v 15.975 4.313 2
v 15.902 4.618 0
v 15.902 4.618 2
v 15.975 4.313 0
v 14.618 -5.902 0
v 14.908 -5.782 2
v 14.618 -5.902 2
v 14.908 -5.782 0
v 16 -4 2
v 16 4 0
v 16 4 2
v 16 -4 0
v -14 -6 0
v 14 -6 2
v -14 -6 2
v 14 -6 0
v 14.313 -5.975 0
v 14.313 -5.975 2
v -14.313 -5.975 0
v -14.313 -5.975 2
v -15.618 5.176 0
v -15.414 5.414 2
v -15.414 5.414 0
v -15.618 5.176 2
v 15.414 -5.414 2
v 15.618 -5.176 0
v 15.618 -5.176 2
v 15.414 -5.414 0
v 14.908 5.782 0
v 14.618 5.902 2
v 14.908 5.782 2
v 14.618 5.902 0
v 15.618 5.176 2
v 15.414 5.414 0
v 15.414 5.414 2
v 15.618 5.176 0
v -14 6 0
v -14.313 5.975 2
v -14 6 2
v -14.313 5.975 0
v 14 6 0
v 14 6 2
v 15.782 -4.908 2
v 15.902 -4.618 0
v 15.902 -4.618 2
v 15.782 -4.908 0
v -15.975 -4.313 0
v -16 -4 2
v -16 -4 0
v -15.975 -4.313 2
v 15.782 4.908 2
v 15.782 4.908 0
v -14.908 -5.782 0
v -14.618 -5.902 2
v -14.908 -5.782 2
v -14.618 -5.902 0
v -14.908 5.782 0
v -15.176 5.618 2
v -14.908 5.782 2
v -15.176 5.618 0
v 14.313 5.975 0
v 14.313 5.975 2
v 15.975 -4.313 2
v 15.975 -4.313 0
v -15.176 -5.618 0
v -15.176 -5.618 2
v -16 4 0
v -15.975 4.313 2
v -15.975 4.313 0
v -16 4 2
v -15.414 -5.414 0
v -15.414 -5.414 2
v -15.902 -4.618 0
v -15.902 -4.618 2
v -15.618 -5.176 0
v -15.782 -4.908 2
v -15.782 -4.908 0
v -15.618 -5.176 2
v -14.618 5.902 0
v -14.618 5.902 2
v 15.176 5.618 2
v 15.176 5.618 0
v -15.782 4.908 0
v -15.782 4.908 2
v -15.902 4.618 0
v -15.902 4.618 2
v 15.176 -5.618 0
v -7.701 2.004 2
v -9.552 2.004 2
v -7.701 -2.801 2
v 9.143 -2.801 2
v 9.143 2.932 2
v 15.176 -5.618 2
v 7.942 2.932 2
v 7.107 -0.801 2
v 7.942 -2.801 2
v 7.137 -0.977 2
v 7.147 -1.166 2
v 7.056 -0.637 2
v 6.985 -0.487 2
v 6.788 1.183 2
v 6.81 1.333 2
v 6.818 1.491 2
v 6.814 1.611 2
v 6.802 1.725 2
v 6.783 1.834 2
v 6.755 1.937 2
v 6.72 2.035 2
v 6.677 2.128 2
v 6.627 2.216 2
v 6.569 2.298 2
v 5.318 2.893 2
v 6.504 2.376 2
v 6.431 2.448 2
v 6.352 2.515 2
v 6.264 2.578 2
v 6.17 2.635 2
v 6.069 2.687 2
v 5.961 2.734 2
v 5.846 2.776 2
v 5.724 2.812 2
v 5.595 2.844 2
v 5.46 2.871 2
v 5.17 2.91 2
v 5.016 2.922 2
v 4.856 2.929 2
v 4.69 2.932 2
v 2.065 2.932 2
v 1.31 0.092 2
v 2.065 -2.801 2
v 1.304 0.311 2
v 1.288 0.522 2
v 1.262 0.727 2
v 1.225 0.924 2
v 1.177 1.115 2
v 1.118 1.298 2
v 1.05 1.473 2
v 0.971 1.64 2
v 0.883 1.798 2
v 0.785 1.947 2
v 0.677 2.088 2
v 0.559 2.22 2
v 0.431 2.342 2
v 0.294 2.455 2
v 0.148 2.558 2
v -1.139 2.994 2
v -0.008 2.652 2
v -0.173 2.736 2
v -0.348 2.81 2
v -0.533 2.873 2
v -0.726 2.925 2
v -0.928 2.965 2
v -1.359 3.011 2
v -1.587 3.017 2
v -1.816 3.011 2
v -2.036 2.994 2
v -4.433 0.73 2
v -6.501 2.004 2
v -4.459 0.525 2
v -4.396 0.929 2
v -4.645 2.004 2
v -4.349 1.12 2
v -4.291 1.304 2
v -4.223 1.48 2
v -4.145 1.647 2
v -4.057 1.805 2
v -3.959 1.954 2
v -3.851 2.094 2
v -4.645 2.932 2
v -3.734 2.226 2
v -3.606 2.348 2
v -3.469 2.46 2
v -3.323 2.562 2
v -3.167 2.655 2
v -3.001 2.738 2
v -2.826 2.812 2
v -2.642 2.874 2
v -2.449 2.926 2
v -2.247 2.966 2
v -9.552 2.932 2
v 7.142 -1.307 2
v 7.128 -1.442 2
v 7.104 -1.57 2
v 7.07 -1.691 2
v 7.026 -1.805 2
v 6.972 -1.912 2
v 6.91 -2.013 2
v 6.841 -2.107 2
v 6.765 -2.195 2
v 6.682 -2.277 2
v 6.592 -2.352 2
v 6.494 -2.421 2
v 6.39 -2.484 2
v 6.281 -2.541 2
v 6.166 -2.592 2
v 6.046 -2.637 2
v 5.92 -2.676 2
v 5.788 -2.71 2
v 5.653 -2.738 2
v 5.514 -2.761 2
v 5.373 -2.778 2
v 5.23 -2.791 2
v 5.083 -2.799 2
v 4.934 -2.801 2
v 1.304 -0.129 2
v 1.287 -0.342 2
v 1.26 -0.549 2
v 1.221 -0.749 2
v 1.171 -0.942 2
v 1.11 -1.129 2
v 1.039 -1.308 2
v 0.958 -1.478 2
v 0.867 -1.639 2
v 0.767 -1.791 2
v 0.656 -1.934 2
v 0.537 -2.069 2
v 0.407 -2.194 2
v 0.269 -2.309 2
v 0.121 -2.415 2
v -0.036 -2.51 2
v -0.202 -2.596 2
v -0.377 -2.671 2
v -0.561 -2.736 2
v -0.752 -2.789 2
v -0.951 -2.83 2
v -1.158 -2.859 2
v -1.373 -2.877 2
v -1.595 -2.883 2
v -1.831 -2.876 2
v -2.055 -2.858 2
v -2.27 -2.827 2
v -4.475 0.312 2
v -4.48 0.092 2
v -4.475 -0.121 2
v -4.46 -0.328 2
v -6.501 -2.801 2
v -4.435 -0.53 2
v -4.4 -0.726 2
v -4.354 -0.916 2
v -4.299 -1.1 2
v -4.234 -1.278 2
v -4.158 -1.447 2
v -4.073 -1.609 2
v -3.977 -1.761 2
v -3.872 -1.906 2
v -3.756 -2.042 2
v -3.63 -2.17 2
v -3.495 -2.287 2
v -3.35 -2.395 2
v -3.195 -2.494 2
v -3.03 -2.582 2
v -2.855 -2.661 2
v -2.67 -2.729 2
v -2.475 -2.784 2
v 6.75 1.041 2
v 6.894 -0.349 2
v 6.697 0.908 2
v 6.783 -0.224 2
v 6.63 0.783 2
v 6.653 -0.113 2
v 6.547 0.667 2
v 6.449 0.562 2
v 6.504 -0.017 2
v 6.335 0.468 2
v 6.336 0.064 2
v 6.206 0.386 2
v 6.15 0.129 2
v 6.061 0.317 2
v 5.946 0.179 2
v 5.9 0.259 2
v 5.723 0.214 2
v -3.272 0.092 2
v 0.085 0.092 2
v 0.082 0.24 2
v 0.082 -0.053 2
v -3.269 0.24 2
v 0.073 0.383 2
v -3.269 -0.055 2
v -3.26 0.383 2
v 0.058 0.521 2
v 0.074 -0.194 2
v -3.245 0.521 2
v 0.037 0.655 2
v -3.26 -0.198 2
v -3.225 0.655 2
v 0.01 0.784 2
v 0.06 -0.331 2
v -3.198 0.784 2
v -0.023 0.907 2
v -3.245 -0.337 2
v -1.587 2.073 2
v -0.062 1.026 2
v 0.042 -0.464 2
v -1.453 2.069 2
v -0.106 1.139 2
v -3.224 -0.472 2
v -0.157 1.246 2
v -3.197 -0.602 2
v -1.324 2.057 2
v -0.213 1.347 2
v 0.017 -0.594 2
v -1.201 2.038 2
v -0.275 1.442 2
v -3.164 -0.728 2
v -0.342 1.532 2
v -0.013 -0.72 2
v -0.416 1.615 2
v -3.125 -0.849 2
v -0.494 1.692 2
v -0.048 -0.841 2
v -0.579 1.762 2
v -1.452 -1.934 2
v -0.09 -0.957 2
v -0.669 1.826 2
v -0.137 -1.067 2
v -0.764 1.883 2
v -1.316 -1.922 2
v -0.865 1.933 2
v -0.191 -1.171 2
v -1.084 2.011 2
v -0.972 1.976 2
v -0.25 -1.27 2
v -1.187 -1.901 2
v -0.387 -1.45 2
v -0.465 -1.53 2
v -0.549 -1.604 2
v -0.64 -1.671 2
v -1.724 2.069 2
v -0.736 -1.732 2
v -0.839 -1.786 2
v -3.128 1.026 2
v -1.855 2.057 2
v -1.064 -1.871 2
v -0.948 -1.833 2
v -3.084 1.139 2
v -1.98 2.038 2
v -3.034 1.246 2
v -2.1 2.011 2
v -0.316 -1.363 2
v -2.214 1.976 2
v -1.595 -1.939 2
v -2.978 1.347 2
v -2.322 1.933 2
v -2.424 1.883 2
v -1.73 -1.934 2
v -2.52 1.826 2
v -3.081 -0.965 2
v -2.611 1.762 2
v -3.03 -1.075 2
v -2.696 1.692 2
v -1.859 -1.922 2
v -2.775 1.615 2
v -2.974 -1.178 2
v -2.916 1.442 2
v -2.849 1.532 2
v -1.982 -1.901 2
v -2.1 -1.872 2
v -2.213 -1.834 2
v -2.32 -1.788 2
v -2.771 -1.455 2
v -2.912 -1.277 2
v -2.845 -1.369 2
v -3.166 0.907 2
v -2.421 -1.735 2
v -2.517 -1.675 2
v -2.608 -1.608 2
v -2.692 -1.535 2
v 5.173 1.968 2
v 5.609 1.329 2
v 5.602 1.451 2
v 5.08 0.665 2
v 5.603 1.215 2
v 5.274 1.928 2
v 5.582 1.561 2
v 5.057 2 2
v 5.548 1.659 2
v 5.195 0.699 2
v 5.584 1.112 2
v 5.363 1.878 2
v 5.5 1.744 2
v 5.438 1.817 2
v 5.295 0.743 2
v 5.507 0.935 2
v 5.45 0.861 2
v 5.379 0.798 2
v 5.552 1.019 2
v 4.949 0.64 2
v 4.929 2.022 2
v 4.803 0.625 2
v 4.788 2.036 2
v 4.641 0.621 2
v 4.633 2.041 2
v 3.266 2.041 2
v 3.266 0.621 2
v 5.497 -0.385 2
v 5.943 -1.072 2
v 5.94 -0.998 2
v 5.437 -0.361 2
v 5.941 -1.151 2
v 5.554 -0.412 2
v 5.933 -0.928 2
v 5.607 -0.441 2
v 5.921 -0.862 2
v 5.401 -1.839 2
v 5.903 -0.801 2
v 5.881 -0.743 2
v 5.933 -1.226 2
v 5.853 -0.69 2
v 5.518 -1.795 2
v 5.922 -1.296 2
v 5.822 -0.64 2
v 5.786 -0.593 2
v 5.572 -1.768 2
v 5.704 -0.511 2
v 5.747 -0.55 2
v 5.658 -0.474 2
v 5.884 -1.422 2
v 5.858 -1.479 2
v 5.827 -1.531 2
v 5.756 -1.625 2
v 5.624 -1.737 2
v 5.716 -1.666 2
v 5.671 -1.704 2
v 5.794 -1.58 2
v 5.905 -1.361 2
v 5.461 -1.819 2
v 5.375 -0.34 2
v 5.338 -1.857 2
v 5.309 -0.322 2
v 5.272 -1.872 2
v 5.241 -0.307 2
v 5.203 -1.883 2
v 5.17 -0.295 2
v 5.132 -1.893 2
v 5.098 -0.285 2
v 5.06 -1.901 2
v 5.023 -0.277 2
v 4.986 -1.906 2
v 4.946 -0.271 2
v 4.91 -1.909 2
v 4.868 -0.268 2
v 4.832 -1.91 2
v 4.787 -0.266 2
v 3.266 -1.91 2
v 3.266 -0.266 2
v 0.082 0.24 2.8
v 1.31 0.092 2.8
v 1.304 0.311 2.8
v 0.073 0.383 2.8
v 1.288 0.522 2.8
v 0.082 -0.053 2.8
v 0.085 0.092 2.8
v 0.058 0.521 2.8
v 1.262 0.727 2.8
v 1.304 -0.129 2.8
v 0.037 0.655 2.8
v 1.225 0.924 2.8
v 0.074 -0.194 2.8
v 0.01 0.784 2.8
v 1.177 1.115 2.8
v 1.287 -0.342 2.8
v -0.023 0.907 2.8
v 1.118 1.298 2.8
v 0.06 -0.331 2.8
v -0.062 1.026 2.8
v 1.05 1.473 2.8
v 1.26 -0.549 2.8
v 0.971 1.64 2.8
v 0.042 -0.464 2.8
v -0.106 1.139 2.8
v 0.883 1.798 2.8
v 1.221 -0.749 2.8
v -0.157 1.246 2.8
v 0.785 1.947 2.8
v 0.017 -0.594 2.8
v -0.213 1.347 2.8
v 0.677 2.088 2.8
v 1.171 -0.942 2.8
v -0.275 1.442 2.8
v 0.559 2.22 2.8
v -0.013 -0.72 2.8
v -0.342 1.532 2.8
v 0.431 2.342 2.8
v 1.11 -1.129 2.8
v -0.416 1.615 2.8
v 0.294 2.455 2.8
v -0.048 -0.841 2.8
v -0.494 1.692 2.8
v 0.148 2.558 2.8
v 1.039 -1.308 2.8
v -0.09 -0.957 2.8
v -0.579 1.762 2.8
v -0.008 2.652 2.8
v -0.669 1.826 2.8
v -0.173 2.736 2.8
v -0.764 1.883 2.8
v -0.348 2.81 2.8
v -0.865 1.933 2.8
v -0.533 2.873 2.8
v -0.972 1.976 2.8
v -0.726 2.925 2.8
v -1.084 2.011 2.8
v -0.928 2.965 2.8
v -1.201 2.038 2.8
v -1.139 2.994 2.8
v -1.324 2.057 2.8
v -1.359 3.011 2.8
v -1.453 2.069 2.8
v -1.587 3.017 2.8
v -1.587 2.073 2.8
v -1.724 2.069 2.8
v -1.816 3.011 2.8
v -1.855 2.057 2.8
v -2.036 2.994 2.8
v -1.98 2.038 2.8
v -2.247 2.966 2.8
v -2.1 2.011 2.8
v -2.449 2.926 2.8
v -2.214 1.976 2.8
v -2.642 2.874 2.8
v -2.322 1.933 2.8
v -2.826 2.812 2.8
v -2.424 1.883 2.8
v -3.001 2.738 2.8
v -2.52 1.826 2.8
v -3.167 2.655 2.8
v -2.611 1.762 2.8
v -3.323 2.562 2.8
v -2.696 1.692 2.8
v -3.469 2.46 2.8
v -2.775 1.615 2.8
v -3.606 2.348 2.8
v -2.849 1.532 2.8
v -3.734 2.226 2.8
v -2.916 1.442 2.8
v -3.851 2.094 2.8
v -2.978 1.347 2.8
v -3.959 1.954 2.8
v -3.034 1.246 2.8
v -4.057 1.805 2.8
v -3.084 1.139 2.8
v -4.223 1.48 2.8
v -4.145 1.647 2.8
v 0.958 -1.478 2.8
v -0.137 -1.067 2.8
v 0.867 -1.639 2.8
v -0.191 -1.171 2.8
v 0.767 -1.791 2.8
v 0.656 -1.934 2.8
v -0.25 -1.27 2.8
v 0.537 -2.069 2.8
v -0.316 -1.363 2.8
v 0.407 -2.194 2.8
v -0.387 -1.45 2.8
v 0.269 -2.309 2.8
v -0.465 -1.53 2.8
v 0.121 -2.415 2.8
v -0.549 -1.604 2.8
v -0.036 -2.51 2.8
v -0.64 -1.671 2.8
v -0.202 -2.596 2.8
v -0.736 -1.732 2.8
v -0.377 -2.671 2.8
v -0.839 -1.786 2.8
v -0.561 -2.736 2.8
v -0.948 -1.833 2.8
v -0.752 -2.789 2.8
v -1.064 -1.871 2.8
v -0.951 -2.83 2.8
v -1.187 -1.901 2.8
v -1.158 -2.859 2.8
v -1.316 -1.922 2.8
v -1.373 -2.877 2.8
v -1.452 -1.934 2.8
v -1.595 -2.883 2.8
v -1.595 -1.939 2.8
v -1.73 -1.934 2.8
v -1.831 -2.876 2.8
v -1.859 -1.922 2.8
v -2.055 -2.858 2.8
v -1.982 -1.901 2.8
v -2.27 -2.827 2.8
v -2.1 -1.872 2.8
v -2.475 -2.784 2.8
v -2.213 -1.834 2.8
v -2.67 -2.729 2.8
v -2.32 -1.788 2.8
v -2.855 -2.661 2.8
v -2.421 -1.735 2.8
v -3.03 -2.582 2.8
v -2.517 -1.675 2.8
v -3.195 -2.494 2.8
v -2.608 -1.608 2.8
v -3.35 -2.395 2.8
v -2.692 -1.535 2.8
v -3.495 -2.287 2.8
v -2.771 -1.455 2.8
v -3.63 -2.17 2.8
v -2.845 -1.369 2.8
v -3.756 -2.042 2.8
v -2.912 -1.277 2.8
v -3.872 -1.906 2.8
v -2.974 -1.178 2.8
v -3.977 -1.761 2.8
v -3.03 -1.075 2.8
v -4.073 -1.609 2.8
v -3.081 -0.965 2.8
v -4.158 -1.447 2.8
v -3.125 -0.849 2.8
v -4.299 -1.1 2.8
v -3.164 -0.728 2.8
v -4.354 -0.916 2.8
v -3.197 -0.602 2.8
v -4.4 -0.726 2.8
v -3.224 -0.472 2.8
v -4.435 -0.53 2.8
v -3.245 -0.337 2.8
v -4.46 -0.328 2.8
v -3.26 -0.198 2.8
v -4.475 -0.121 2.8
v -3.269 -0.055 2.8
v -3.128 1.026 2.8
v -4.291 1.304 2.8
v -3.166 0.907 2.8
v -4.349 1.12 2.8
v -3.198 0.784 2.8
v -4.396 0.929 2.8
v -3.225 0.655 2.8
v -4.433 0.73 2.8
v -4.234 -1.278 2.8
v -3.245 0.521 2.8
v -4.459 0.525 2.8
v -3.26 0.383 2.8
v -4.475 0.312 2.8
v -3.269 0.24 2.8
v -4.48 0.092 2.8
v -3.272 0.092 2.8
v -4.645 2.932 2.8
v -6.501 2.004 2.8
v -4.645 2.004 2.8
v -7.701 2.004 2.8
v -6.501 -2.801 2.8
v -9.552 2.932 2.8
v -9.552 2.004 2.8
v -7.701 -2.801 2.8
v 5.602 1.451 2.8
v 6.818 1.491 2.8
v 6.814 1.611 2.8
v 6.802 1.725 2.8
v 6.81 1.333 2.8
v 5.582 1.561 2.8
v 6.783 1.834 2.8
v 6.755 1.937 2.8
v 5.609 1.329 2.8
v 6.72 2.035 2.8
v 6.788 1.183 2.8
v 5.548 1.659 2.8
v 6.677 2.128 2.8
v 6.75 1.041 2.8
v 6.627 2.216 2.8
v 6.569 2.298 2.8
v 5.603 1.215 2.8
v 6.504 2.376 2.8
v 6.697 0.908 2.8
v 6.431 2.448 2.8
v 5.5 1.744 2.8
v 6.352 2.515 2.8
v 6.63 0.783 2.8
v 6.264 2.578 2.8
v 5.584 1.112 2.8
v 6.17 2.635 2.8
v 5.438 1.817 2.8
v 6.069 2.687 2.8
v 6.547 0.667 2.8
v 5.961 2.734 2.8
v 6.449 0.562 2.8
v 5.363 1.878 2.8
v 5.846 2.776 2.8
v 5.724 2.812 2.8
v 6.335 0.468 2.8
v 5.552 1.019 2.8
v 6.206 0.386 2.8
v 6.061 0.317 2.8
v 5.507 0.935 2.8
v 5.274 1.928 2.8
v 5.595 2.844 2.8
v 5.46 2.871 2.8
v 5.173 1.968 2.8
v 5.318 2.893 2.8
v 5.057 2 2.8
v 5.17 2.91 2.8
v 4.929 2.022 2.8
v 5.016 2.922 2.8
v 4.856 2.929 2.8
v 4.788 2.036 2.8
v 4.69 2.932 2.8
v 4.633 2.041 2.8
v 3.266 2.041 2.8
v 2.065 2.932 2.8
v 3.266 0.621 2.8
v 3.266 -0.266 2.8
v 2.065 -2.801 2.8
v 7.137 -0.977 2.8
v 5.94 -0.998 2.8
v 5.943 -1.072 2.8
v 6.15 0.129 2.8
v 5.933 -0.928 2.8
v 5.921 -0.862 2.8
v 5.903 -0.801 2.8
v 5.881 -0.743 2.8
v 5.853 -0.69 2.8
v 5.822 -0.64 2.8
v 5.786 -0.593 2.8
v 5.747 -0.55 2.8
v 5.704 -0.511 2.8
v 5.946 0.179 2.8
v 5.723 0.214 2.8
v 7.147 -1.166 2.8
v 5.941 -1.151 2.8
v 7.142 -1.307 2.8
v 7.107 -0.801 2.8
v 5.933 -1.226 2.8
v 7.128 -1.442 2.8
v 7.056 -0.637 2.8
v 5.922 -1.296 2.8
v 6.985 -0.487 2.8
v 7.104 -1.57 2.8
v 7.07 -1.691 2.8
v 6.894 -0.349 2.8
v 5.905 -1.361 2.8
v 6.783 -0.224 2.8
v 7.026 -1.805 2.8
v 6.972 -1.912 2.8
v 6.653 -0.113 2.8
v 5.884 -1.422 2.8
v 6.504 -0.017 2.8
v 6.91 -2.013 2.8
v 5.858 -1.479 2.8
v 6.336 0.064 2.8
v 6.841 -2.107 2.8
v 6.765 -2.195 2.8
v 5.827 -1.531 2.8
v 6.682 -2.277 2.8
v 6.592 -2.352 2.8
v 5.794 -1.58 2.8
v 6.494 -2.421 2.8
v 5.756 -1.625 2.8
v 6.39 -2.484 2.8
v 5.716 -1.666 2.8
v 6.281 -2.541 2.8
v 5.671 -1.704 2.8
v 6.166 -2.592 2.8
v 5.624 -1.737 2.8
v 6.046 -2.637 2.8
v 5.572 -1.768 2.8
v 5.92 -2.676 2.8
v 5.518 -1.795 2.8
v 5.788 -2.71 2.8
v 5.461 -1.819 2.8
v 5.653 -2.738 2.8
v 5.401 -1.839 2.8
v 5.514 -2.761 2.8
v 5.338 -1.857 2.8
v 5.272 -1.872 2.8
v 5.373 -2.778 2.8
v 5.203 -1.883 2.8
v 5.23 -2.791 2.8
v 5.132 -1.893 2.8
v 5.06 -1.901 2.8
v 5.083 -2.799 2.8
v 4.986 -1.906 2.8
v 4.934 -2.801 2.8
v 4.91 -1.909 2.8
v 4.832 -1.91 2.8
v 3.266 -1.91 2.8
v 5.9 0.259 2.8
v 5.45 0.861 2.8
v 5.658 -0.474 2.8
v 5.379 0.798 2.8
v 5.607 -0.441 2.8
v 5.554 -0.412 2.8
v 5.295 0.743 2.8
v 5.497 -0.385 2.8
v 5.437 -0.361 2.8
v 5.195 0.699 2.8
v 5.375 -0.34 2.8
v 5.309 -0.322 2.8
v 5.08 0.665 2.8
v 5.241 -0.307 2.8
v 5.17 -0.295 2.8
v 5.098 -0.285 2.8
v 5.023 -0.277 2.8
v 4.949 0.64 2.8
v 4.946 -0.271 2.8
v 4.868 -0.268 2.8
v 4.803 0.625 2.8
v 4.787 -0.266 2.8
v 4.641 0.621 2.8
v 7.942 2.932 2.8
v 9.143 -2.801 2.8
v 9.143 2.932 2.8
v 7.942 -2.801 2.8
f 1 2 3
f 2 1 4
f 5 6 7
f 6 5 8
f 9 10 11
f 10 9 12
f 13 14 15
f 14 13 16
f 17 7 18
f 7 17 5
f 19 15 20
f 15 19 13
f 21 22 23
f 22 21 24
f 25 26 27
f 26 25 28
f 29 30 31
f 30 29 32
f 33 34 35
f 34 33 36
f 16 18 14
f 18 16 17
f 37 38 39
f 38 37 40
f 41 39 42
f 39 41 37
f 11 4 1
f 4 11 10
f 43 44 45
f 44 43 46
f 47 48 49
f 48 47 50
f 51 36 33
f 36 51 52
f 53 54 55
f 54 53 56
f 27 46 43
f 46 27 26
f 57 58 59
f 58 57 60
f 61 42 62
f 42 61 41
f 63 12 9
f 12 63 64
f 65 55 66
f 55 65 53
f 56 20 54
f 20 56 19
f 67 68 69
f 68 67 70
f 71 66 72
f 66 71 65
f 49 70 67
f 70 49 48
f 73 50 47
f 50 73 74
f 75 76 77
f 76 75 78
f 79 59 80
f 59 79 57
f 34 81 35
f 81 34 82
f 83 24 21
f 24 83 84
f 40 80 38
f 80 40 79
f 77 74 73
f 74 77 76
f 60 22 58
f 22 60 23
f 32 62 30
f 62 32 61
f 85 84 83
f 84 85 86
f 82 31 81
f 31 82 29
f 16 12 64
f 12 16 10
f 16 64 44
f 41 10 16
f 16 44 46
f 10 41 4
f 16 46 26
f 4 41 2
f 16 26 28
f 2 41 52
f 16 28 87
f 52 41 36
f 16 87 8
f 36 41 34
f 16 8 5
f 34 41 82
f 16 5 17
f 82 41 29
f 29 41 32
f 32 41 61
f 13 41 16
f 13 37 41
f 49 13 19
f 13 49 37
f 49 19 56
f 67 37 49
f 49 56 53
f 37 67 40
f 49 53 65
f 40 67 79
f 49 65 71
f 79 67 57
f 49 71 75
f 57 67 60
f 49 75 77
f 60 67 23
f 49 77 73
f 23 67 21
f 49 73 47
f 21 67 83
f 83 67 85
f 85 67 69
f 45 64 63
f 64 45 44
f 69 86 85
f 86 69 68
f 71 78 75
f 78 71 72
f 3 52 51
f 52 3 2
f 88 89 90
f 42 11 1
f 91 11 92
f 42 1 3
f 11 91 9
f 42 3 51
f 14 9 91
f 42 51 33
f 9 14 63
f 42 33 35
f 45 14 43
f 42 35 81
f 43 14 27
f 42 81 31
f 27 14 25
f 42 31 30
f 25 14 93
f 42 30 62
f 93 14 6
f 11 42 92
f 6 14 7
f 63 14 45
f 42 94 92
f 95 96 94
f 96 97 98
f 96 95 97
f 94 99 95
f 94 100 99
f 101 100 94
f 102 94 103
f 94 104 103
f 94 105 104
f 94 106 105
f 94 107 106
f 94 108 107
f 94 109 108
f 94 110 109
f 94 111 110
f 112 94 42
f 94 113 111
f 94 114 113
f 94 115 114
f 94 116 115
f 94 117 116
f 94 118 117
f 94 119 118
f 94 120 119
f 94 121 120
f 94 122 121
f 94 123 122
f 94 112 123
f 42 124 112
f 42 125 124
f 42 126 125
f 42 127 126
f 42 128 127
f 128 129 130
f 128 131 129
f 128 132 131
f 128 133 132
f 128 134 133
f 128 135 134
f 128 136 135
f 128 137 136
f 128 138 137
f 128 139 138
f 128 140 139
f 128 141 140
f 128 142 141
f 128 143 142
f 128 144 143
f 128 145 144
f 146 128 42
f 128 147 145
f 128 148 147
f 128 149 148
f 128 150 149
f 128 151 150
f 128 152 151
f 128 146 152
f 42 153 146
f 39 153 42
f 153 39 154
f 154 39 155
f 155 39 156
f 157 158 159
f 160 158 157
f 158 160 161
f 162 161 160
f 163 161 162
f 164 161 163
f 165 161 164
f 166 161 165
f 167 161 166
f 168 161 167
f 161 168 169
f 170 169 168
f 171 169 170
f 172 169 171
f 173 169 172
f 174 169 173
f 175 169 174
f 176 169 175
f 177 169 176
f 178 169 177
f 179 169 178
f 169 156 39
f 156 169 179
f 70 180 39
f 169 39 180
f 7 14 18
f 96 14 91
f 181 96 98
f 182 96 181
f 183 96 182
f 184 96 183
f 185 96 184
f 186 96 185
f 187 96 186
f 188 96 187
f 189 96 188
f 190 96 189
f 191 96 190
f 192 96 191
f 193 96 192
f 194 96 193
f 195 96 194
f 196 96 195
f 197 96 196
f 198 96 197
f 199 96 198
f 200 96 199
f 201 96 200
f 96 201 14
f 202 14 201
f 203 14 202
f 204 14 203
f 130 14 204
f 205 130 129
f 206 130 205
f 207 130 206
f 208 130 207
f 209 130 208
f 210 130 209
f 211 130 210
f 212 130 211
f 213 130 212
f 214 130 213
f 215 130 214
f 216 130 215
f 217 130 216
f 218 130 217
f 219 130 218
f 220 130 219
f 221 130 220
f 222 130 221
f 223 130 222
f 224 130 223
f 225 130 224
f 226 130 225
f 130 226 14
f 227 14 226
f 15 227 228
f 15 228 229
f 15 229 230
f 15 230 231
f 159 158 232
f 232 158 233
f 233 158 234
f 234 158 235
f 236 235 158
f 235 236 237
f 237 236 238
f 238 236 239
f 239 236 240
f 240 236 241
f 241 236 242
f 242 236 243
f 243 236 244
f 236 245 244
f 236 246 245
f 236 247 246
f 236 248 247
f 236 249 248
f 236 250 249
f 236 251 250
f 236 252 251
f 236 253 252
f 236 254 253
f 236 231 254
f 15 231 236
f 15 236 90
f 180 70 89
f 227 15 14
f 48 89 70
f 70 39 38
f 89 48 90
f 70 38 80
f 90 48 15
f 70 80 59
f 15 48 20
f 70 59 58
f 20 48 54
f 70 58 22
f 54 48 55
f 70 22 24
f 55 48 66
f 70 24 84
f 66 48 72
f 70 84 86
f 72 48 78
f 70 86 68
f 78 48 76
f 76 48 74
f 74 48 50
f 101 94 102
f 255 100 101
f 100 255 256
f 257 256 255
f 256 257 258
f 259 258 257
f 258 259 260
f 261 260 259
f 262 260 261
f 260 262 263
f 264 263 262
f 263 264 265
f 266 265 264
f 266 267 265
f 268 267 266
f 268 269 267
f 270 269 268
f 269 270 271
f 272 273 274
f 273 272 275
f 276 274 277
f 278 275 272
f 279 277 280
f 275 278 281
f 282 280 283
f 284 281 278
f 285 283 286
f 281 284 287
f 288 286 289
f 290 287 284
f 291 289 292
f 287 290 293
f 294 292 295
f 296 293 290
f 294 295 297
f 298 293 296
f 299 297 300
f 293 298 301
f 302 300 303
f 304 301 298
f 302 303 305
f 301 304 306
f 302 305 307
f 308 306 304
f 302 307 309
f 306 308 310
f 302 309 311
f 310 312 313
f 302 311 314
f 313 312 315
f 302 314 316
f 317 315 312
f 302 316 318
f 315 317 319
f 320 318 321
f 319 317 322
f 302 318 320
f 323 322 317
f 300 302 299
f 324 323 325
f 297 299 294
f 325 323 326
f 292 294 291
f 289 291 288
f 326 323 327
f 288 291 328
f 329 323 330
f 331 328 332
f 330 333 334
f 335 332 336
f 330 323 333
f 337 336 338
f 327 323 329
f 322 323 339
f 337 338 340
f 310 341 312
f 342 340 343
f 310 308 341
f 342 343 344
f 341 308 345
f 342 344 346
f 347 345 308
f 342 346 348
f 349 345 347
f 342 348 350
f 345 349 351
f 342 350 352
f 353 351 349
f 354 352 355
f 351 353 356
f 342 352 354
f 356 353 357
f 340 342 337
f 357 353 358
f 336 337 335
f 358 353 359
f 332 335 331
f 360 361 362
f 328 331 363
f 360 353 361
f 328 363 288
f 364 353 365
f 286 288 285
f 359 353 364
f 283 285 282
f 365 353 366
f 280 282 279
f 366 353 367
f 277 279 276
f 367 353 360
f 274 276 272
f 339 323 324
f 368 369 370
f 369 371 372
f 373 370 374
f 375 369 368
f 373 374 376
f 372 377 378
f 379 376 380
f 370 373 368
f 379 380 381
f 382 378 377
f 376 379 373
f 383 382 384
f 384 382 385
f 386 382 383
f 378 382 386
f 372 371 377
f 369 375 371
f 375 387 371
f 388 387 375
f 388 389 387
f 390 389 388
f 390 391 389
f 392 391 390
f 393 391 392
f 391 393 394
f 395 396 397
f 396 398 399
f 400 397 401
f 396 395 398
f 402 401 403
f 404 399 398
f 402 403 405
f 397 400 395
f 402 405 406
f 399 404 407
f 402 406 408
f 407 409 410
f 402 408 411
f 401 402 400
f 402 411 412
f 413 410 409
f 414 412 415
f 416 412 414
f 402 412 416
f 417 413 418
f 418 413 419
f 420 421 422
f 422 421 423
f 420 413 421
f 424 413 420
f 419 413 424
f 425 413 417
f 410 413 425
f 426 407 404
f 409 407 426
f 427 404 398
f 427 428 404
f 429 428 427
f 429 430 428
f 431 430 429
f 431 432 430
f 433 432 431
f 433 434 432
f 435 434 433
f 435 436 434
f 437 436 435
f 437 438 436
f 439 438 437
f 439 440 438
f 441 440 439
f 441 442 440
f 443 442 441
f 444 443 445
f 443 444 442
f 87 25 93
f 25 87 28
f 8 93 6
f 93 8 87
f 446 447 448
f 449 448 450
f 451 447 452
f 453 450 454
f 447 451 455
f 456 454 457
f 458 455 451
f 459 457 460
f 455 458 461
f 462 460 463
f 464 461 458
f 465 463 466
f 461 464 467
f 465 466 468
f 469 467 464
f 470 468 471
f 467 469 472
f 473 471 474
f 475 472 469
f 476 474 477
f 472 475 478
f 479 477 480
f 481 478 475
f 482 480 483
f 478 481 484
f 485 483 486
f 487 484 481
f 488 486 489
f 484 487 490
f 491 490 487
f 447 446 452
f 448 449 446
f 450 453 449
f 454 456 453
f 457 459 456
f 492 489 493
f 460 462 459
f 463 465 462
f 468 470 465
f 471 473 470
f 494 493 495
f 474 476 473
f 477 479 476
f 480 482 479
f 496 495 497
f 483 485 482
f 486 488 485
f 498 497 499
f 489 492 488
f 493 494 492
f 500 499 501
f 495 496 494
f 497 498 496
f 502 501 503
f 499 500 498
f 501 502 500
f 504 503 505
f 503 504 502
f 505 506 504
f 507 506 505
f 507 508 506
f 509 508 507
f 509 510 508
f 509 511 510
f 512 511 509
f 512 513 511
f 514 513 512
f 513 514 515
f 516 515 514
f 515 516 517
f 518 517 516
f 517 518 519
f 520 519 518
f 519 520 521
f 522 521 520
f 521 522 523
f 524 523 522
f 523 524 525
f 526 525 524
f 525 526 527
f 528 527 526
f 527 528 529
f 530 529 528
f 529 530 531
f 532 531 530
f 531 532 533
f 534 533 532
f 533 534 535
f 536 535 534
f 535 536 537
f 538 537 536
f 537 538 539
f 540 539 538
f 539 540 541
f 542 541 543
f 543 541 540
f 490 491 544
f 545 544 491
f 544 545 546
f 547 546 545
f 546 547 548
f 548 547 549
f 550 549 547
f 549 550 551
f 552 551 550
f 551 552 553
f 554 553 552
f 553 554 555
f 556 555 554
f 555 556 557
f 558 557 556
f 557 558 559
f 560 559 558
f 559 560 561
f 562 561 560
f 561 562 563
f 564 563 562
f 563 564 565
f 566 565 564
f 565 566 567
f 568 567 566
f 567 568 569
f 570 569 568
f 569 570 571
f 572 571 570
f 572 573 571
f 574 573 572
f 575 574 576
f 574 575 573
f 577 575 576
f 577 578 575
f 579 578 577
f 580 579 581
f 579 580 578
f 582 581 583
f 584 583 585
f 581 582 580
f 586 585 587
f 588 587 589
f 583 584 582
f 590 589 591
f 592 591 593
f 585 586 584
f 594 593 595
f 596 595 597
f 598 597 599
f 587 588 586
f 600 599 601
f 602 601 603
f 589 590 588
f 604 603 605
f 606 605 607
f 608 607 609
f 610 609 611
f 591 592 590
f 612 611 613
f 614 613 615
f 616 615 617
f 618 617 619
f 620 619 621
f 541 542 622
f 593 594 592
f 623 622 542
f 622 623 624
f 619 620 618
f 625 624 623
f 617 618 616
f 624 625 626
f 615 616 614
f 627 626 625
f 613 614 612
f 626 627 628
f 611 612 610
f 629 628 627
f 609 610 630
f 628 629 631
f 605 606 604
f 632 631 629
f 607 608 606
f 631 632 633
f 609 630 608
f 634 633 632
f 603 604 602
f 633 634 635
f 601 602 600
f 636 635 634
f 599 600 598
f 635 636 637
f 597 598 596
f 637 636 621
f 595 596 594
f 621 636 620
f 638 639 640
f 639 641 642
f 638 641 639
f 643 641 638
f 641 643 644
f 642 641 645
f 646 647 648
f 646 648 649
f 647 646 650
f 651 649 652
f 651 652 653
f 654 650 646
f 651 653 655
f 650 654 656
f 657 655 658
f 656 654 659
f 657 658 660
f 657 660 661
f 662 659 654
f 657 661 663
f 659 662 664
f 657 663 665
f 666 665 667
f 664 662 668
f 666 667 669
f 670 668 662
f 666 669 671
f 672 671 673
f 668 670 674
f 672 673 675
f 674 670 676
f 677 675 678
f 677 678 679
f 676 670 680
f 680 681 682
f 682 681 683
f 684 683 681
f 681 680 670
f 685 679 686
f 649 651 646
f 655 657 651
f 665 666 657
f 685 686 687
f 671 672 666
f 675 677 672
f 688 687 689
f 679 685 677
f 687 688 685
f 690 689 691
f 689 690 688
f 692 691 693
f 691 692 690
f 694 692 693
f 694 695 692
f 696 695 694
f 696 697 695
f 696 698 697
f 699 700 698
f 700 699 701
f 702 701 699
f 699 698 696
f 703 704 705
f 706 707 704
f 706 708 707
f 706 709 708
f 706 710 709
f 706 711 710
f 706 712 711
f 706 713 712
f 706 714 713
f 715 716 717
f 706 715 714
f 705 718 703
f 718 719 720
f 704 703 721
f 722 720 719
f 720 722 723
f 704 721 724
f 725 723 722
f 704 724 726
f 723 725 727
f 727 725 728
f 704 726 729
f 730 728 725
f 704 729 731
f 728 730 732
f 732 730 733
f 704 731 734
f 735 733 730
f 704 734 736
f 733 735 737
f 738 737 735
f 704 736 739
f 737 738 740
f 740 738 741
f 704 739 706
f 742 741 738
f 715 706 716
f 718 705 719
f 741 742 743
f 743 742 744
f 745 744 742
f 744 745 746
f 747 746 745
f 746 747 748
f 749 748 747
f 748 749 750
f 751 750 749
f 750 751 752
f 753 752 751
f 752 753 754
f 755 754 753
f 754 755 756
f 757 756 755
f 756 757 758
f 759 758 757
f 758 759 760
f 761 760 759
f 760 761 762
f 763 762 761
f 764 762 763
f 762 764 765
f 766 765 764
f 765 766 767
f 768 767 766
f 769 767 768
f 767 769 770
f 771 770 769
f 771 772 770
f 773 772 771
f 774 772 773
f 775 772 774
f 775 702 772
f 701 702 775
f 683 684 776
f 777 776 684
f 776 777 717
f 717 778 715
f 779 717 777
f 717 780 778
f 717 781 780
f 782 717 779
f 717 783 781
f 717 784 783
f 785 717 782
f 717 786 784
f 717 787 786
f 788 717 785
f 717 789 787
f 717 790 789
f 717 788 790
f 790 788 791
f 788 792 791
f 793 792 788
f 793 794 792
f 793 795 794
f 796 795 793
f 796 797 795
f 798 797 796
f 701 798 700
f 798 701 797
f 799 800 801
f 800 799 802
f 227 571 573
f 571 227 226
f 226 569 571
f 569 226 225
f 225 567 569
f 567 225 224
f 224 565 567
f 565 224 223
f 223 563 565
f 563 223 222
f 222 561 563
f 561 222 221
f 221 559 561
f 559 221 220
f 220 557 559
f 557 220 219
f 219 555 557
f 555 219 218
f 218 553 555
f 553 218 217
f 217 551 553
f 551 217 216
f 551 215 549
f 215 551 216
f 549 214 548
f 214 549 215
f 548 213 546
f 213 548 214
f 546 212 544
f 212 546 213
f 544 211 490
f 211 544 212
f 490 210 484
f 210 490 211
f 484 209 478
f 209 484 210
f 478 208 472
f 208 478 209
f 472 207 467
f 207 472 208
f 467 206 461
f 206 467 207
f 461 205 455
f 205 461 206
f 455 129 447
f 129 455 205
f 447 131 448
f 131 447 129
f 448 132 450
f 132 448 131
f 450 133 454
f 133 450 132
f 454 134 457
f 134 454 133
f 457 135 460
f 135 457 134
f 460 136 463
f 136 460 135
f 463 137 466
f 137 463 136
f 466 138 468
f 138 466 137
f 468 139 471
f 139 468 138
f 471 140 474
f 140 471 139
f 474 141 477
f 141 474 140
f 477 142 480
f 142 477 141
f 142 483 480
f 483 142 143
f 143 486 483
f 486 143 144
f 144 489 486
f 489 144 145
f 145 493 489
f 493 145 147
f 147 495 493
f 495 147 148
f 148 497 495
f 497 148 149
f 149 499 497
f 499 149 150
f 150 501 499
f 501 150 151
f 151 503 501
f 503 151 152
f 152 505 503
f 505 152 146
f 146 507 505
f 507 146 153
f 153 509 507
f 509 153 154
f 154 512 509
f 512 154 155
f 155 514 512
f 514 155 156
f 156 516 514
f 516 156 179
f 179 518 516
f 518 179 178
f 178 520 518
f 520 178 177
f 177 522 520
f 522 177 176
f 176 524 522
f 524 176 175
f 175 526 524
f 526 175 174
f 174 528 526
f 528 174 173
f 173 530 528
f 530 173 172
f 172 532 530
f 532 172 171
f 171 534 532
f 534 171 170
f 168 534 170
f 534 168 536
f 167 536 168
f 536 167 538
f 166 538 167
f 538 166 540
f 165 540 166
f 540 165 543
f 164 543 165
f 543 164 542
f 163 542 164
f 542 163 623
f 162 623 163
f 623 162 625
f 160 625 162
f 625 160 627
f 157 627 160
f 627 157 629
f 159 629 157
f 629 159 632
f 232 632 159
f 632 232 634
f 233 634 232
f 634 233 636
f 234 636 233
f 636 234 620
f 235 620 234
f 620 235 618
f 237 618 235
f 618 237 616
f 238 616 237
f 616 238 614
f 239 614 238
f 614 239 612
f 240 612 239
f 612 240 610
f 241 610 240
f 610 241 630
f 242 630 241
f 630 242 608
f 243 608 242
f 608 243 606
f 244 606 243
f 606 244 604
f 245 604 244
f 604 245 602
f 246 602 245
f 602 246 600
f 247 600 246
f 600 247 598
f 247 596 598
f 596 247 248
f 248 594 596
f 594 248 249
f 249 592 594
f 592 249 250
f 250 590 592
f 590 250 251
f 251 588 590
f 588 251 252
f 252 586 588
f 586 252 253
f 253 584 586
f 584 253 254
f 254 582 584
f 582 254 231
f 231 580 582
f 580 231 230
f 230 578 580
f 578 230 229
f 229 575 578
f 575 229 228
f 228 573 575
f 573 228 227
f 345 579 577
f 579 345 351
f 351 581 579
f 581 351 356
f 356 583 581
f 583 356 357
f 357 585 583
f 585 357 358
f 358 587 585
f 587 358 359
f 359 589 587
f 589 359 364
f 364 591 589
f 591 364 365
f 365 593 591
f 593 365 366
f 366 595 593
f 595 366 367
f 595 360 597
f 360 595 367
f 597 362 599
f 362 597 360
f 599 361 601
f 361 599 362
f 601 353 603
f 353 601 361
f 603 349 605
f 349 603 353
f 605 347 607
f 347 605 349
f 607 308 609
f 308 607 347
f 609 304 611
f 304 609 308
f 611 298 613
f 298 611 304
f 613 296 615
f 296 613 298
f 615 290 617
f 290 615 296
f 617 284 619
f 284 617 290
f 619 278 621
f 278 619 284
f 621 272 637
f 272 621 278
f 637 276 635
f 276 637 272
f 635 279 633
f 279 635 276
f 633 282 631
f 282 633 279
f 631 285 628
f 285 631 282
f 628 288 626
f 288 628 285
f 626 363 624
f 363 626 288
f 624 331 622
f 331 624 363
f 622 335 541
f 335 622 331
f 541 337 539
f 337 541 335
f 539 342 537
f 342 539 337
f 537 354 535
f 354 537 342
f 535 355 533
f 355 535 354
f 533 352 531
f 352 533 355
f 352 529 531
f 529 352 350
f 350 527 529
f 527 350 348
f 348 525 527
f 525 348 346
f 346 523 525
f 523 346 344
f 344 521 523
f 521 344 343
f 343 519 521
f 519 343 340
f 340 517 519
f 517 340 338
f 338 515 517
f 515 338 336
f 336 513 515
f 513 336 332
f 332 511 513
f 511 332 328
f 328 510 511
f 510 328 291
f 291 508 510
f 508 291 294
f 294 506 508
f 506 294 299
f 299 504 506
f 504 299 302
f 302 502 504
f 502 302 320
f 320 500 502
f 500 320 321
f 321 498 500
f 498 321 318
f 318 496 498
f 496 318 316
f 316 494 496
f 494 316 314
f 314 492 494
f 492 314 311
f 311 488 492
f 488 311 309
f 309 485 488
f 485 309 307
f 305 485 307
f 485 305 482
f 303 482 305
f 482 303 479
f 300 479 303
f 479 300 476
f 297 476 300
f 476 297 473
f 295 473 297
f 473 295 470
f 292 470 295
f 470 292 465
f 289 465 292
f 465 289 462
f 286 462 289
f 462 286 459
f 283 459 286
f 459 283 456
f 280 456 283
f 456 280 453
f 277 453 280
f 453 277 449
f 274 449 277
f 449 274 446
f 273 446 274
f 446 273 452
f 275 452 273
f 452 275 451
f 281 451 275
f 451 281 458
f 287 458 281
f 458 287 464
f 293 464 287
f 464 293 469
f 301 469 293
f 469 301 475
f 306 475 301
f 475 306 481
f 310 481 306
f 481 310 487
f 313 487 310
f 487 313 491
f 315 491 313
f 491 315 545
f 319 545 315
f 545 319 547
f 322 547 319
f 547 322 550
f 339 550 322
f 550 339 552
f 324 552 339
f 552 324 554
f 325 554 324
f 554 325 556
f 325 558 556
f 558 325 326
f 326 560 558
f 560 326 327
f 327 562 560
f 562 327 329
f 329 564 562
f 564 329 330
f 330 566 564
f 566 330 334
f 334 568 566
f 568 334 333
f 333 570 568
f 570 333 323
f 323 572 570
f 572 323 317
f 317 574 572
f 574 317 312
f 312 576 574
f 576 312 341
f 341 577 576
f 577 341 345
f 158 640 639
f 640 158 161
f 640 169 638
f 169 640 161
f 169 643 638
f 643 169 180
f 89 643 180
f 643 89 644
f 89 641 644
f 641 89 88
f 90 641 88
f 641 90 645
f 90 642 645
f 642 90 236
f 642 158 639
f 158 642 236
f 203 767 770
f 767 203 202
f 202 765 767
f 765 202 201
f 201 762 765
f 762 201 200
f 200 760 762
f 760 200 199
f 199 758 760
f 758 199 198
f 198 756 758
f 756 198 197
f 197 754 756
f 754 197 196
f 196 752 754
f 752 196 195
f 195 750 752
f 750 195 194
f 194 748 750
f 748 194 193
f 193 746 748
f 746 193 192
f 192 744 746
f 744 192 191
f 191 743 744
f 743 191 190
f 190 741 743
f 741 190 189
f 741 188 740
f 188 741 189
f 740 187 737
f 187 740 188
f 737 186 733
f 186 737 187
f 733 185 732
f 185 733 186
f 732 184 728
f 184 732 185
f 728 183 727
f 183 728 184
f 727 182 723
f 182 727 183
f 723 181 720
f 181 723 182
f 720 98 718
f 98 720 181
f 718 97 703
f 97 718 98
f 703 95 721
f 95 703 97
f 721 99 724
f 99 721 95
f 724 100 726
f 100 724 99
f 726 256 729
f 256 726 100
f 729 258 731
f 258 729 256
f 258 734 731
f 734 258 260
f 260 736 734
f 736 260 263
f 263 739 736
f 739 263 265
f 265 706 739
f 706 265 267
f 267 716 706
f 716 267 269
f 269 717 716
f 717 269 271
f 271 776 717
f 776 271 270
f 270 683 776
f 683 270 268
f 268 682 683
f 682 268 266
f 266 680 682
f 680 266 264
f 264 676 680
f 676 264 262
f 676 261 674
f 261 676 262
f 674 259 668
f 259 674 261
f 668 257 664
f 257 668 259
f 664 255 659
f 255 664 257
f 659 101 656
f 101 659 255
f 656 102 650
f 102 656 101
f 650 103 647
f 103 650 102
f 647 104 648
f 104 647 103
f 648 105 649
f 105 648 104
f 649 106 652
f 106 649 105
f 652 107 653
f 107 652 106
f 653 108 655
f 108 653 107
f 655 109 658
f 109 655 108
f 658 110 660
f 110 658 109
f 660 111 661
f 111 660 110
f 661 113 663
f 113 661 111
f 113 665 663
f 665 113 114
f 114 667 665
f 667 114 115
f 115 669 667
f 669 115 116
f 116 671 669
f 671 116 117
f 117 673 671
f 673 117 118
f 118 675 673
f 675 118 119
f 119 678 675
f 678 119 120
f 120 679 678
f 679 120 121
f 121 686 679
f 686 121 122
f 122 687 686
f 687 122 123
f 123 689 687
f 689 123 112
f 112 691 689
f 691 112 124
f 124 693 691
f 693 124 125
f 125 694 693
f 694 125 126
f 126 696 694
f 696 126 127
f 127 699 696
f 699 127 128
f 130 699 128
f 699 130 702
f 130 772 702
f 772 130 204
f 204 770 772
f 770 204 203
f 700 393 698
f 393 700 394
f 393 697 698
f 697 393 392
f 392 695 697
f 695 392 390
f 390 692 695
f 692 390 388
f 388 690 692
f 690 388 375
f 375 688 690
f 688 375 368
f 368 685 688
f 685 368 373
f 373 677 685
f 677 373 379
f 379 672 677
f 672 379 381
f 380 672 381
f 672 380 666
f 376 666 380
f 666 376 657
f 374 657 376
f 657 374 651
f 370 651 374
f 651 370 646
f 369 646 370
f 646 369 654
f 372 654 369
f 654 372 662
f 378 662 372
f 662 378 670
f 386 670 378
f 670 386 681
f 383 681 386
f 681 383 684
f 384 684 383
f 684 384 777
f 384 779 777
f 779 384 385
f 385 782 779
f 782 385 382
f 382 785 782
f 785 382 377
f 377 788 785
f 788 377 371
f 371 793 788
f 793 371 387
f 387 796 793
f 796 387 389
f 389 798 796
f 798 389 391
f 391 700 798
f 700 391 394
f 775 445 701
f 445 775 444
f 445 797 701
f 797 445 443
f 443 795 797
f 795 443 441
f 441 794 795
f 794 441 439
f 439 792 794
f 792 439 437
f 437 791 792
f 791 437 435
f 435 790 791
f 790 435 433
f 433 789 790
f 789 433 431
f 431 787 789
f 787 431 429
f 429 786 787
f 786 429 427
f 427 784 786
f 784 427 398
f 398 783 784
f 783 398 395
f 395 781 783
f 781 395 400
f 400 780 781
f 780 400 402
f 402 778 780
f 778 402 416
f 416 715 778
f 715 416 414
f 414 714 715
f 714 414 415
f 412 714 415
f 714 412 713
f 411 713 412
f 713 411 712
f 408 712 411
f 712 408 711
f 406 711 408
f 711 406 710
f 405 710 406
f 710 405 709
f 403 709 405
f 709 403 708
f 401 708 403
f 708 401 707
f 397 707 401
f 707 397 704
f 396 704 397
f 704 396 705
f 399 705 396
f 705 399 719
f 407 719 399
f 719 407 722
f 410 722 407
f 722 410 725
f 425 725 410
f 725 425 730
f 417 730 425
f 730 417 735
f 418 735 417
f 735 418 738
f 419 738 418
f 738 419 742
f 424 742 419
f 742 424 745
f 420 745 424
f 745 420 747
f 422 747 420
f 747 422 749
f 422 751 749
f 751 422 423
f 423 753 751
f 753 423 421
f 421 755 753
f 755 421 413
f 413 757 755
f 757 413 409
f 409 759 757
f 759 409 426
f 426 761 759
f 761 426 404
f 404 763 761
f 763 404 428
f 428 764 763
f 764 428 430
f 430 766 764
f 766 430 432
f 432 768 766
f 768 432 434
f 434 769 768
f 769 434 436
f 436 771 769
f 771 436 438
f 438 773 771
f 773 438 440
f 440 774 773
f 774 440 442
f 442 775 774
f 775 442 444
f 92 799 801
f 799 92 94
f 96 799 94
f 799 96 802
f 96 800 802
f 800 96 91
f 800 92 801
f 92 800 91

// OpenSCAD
// Course accessory, dimensions in mm. Do not scale the original shell to fit it.
pet_name = "TOBI";
plate_w = 32;
plate_h = 12;
plate_t = 2;
letter_h = 0.8;
font_size = 6;
$fn = 40;
linear_extrude(plate_t)
    offset(r=2) square([plate_w-4, plate_h-4], center=true);
translate([0,0,plate_t-0.05])
    linear_extrude(letter_h+0.05)
        text(pet_name, size=font_size, halign="center", valign="center", font="Liberation Sans:style=Bold");
